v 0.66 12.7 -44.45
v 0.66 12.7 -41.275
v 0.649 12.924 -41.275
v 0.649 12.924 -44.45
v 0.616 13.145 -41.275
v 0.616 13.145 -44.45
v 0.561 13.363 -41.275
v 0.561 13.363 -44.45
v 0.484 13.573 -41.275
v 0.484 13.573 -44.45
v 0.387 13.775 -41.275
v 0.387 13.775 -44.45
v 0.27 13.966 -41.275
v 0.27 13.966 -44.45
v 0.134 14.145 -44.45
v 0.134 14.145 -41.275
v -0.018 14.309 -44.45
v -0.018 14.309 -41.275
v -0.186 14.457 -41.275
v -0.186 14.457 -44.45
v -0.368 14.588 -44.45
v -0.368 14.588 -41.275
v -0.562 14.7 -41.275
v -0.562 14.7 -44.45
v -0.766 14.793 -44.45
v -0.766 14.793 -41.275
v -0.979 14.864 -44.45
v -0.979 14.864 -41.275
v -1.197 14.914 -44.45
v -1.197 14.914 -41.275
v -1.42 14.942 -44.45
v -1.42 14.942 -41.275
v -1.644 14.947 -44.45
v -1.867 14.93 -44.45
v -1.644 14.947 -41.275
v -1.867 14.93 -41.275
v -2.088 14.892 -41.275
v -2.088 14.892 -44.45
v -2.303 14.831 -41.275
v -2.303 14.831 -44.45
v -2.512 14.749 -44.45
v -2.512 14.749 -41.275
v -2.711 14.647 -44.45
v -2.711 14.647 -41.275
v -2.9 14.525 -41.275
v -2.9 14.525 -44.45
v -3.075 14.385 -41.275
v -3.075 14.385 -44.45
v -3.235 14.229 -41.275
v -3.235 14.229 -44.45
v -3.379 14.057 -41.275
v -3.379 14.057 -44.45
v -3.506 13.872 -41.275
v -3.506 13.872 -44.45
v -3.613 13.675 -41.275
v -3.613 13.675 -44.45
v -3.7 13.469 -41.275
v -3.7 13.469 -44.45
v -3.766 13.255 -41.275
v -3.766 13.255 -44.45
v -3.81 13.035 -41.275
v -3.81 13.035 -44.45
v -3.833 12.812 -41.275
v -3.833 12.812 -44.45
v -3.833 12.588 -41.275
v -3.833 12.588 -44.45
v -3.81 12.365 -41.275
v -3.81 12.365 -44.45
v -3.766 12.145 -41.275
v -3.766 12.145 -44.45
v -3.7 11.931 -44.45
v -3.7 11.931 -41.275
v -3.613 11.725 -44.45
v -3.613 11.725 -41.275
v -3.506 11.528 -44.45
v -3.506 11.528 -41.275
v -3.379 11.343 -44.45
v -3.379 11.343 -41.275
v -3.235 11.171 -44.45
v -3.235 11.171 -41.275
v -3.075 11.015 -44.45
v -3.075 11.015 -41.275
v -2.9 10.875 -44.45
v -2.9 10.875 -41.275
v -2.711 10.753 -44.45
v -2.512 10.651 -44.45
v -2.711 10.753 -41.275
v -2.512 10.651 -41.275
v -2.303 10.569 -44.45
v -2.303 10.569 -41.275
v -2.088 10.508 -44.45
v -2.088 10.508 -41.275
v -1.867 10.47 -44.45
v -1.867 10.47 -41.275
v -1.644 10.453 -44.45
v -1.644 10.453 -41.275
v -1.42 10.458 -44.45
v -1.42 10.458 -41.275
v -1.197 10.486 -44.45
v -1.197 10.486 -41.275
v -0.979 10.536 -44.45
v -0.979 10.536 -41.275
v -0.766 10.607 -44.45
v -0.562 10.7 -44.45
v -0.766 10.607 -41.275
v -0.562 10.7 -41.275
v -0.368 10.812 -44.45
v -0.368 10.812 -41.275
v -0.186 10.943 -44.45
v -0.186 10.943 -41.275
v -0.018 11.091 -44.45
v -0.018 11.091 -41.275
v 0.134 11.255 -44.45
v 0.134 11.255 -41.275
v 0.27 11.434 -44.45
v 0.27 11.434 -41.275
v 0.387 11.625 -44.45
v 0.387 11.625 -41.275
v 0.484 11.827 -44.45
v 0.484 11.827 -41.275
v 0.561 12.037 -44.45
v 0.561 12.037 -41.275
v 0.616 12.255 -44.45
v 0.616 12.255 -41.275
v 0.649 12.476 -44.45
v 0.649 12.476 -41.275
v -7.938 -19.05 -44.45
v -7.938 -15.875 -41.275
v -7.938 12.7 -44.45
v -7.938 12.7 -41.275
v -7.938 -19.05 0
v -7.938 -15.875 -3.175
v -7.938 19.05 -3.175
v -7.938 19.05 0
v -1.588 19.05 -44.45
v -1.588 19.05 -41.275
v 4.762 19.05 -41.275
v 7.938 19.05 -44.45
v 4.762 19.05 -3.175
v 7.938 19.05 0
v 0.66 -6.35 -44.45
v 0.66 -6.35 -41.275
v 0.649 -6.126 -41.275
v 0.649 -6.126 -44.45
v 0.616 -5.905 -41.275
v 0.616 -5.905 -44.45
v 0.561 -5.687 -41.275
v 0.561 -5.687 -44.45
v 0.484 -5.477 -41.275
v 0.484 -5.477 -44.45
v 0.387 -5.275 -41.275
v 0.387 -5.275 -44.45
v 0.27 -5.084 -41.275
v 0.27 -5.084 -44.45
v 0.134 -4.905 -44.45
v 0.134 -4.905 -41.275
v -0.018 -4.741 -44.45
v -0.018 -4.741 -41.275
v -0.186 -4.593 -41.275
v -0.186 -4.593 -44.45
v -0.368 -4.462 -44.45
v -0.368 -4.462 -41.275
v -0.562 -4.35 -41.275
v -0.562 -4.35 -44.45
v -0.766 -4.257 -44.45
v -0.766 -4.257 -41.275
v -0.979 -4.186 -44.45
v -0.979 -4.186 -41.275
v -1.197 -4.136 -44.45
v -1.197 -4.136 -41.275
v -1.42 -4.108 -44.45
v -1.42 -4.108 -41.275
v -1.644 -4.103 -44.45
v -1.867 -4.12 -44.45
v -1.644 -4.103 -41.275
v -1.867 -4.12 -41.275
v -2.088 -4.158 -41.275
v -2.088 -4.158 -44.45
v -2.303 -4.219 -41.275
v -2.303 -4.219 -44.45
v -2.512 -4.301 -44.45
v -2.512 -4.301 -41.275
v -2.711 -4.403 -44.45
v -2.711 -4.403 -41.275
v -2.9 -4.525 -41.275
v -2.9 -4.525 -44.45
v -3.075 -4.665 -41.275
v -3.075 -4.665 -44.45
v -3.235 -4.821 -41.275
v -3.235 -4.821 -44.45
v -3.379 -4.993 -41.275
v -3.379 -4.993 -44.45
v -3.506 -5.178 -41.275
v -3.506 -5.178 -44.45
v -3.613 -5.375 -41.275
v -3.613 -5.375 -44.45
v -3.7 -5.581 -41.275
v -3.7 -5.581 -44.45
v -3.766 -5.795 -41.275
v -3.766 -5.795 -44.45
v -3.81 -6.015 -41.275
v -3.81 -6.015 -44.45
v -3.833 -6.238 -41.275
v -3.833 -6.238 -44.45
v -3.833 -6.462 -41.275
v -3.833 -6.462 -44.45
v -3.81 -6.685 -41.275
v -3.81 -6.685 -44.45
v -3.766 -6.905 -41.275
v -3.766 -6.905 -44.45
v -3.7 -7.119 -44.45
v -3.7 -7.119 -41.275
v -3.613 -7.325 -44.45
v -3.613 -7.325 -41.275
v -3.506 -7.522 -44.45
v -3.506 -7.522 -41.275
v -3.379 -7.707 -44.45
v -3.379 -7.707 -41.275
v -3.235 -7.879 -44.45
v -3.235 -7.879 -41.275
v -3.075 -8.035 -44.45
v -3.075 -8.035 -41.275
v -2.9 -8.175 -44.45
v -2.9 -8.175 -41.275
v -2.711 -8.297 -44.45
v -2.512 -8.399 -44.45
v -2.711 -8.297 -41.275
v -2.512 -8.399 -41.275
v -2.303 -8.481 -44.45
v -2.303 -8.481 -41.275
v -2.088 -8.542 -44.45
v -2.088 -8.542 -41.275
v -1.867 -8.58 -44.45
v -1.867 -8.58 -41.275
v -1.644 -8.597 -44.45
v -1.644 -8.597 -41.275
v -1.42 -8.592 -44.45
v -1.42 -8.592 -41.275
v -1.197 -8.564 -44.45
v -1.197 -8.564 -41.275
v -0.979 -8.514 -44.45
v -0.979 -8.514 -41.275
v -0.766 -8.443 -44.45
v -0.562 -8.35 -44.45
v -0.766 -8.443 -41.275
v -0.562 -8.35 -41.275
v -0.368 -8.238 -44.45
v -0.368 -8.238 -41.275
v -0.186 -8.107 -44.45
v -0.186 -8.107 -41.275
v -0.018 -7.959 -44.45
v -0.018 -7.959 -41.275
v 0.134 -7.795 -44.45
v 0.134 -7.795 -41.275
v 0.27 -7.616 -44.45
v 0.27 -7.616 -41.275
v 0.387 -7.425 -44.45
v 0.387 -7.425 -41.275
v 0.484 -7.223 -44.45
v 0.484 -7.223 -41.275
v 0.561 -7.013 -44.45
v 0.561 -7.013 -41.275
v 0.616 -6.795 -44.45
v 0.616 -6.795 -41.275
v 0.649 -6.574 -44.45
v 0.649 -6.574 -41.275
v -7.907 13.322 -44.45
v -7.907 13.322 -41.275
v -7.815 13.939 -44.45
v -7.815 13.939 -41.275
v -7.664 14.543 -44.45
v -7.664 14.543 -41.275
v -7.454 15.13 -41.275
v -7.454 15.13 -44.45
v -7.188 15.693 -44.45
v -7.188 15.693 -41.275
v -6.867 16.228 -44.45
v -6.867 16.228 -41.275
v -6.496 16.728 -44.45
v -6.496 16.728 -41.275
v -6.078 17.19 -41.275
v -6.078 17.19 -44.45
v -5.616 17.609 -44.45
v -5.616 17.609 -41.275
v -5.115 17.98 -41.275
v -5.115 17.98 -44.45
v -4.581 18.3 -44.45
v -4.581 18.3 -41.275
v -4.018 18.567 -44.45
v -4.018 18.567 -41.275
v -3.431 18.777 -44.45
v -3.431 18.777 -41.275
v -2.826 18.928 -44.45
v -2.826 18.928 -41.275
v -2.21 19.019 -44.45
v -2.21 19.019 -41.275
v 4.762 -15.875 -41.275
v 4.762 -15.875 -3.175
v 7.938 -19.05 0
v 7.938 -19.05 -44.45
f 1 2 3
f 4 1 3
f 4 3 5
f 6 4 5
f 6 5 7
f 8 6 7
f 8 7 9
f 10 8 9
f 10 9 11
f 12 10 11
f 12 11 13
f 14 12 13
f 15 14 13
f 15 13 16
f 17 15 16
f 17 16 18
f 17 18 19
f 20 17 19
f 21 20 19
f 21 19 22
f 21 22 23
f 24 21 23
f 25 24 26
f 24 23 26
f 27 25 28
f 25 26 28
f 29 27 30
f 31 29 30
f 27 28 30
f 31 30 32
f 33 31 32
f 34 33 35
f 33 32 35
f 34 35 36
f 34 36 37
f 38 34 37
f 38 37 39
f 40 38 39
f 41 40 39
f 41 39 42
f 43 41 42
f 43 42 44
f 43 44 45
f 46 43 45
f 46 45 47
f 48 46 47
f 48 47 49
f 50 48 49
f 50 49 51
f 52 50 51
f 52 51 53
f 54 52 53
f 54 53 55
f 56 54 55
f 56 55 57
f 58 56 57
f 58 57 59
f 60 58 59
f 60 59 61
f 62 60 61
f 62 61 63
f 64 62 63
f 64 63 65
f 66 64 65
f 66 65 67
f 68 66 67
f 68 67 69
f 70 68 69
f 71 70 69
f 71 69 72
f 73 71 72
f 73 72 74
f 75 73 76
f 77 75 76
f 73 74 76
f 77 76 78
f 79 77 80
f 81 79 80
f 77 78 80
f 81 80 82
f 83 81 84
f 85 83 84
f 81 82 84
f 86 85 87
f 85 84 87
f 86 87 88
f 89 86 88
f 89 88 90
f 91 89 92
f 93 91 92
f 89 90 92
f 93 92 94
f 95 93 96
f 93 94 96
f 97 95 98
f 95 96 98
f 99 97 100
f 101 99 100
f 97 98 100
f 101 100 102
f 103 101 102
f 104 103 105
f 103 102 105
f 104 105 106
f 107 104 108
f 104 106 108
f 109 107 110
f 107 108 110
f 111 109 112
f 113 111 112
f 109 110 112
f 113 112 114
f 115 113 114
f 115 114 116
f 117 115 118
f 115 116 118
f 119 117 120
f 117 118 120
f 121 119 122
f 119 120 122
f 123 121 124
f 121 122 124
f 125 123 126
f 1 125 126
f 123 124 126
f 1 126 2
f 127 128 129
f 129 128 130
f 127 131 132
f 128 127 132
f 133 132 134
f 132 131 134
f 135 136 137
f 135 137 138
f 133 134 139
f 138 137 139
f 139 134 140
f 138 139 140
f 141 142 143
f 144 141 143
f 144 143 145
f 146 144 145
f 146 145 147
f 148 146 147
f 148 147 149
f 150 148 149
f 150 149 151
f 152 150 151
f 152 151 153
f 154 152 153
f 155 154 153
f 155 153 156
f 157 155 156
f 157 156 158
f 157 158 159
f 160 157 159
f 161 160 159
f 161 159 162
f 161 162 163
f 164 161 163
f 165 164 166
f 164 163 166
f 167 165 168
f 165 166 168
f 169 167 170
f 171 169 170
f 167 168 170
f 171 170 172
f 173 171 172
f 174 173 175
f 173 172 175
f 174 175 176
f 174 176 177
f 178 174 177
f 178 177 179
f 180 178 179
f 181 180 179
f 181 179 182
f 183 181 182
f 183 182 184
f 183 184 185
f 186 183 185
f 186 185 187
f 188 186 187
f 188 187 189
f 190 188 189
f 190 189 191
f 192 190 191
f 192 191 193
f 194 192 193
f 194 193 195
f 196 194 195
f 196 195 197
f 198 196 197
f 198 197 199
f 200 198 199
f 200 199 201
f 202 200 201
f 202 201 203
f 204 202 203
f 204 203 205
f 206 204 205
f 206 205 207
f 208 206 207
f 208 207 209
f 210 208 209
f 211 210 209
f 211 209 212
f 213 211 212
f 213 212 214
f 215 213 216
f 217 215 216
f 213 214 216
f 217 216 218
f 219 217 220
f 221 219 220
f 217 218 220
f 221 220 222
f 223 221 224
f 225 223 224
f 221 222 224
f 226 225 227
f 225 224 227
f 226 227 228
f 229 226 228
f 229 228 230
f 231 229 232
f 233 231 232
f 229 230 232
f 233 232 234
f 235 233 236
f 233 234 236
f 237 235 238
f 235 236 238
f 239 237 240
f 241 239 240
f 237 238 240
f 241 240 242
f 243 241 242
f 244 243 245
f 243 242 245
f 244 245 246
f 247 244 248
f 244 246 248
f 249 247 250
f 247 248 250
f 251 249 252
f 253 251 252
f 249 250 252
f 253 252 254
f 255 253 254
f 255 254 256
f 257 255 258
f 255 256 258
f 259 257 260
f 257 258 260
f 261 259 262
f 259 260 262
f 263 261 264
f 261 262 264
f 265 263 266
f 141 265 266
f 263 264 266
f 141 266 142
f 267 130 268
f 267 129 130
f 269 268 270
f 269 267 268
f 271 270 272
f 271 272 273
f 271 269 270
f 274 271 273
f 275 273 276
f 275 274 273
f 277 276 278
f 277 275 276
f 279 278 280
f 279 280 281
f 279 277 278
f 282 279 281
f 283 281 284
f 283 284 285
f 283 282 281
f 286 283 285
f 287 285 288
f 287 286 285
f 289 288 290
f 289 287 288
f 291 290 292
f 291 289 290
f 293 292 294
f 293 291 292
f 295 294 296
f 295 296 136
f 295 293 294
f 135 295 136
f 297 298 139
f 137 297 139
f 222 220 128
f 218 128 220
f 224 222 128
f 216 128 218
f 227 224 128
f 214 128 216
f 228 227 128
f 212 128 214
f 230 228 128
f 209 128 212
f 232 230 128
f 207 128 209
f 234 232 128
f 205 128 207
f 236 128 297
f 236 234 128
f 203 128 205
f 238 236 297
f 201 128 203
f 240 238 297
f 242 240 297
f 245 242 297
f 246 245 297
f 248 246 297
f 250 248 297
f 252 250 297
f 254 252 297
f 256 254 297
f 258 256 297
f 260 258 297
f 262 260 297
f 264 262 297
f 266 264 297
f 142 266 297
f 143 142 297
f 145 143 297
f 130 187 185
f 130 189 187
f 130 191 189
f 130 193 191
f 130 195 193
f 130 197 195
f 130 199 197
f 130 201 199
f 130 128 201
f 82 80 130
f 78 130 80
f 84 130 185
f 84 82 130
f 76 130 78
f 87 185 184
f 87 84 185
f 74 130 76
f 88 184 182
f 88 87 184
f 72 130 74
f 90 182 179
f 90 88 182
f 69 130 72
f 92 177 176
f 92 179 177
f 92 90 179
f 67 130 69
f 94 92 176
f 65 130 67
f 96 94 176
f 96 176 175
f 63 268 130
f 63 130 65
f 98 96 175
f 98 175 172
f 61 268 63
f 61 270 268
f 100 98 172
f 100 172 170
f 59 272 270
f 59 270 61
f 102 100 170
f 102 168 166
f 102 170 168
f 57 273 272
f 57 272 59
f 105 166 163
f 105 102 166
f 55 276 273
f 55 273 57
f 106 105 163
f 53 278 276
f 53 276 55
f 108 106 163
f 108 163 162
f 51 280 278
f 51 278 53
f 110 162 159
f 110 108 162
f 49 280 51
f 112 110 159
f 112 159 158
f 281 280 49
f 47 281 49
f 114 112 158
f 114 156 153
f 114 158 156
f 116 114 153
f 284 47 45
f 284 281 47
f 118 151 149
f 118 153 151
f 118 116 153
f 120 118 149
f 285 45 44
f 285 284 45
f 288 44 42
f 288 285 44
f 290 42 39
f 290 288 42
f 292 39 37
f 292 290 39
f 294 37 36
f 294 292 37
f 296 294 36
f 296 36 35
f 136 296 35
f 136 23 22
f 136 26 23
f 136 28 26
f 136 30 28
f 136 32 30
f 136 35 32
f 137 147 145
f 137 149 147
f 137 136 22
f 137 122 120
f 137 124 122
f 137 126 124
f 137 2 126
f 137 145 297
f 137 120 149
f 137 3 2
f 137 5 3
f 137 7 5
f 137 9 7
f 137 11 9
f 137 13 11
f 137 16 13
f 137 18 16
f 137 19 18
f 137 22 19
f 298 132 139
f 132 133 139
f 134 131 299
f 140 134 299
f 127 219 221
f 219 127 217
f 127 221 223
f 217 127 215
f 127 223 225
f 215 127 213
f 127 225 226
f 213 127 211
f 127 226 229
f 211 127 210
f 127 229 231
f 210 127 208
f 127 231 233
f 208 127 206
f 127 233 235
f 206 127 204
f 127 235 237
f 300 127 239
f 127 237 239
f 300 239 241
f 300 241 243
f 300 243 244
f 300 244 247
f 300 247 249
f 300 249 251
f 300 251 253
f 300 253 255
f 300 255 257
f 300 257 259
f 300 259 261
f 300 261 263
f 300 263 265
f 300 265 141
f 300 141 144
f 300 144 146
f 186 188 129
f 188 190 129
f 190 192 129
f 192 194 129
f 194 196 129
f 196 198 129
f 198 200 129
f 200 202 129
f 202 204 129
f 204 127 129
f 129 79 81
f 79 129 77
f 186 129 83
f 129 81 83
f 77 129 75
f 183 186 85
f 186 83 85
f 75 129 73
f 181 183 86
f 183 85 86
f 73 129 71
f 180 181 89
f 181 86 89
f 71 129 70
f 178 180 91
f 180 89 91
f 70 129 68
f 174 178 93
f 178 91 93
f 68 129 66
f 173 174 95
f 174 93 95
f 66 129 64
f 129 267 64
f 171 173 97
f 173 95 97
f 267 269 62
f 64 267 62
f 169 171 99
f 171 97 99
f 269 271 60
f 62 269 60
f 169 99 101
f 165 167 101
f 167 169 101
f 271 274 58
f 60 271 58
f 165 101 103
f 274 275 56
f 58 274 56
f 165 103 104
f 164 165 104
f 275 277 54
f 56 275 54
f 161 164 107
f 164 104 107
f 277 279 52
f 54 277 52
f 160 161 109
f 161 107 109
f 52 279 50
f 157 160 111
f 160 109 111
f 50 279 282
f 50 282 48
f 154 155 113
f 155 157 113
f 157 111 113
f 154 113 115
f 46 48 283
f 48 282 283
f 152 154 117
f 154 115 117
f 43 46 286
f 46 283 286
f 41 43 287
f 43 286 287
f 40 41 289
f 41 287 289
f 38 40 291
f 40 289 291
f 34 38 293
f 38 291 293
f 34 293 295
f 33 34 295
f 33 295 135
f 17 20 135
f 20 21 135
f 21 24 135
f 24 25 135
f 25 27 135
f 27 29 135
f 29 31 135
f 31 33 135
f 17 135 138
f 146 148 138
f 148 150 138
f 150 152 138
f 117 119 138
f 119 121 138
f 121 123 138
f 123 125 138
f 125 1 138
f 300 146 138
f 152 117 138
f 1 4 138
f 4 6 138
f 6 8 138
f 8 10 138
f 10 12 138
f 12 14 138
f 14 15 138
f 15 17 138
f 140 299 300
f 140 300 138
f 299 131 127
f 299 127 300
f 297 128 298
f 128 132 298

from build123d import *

# Parameters (mm, degrees)
SKETCH1_W           = 15.875
SKETCH1_H           = 38.1
BOSS_EXTRUDE1_DEPTH = 44.45
SHELL1_T            = -3.175
CUT_EXTRUDE1_REACH  = 48.147
SKETCH2_R           = 2.2479
FILLET2_R           = 6.35


with BuildPart() as part:
    # Sketch1 → Boss-Extrude1 (new body)
    with BuildSketch(Plane.XY):
        Rectangle(SKETCH1_W, SKETCH1_H)
    extrude(amount=-BOSS_EXTRUDE1_DEPTH)

    # Shell1
    shell1_openings = [part.faces().sort_by_distance(p)[0] for p in [
        (-7.9375, 0, -22.225),
        (0, 19.05, -22.225),
    ]]
    offset(amount=SHELL1_T, openings=shell1_openings, kind=Kind.INTERSECTION)

    # Sketch2 → Cut-Extrude1 (cut, up to next)
    with BuildSketch(Plane.XY.offset(-3.175), mode=Mode.PRIVATE) as cut_extrude1_sk1:
        with Locations((-1.5875, -6.35)):
            Circle(SKETCH2_R)
    cut_extrude1_tool1 = extrude(cut_extrude1_sk1.sketch, amount=-CUT_EXTRUDE1_REACH, mode=Mode.PRIVATE) & part.part
    # Sketch2 → Cut-Extrude1 (cut, up to next)
    with BuildSketch(Plane.XY.offset(-3.175), mode=Mode.PRIVATE) as cut_extrude1_sk2:
        with Locations((-1.5875, 12.7)):
            Circle(SKETCH2_R)
    cut_extrude1_tool2 = extrude(cut_extrude1_sk2.sketch, amount=-CUT_EXTRUDE1_REACH, mode=Mode.PRIVATE) & part.part
    add(cut_extrude1_tool1.solids().sort_by_distance((-1.5875, -6.35, -3.175))[0], mode=Mode.SUBTRACT)
    add(cut_extrude1_tool2.solids().sort_by_distance((-1.5875, 12.7, -3.175))[0], mode=Mode.SUBTRACT)

    # Fillet2
    fillet2_edges = [part.edges().sort_by_distance(p)[0] for p in [
        (-7.9375, 19.05, -42.8625),
    ]]
    fillet(fillet2_edges, radius=FILLET2_R)


solid = part.part
